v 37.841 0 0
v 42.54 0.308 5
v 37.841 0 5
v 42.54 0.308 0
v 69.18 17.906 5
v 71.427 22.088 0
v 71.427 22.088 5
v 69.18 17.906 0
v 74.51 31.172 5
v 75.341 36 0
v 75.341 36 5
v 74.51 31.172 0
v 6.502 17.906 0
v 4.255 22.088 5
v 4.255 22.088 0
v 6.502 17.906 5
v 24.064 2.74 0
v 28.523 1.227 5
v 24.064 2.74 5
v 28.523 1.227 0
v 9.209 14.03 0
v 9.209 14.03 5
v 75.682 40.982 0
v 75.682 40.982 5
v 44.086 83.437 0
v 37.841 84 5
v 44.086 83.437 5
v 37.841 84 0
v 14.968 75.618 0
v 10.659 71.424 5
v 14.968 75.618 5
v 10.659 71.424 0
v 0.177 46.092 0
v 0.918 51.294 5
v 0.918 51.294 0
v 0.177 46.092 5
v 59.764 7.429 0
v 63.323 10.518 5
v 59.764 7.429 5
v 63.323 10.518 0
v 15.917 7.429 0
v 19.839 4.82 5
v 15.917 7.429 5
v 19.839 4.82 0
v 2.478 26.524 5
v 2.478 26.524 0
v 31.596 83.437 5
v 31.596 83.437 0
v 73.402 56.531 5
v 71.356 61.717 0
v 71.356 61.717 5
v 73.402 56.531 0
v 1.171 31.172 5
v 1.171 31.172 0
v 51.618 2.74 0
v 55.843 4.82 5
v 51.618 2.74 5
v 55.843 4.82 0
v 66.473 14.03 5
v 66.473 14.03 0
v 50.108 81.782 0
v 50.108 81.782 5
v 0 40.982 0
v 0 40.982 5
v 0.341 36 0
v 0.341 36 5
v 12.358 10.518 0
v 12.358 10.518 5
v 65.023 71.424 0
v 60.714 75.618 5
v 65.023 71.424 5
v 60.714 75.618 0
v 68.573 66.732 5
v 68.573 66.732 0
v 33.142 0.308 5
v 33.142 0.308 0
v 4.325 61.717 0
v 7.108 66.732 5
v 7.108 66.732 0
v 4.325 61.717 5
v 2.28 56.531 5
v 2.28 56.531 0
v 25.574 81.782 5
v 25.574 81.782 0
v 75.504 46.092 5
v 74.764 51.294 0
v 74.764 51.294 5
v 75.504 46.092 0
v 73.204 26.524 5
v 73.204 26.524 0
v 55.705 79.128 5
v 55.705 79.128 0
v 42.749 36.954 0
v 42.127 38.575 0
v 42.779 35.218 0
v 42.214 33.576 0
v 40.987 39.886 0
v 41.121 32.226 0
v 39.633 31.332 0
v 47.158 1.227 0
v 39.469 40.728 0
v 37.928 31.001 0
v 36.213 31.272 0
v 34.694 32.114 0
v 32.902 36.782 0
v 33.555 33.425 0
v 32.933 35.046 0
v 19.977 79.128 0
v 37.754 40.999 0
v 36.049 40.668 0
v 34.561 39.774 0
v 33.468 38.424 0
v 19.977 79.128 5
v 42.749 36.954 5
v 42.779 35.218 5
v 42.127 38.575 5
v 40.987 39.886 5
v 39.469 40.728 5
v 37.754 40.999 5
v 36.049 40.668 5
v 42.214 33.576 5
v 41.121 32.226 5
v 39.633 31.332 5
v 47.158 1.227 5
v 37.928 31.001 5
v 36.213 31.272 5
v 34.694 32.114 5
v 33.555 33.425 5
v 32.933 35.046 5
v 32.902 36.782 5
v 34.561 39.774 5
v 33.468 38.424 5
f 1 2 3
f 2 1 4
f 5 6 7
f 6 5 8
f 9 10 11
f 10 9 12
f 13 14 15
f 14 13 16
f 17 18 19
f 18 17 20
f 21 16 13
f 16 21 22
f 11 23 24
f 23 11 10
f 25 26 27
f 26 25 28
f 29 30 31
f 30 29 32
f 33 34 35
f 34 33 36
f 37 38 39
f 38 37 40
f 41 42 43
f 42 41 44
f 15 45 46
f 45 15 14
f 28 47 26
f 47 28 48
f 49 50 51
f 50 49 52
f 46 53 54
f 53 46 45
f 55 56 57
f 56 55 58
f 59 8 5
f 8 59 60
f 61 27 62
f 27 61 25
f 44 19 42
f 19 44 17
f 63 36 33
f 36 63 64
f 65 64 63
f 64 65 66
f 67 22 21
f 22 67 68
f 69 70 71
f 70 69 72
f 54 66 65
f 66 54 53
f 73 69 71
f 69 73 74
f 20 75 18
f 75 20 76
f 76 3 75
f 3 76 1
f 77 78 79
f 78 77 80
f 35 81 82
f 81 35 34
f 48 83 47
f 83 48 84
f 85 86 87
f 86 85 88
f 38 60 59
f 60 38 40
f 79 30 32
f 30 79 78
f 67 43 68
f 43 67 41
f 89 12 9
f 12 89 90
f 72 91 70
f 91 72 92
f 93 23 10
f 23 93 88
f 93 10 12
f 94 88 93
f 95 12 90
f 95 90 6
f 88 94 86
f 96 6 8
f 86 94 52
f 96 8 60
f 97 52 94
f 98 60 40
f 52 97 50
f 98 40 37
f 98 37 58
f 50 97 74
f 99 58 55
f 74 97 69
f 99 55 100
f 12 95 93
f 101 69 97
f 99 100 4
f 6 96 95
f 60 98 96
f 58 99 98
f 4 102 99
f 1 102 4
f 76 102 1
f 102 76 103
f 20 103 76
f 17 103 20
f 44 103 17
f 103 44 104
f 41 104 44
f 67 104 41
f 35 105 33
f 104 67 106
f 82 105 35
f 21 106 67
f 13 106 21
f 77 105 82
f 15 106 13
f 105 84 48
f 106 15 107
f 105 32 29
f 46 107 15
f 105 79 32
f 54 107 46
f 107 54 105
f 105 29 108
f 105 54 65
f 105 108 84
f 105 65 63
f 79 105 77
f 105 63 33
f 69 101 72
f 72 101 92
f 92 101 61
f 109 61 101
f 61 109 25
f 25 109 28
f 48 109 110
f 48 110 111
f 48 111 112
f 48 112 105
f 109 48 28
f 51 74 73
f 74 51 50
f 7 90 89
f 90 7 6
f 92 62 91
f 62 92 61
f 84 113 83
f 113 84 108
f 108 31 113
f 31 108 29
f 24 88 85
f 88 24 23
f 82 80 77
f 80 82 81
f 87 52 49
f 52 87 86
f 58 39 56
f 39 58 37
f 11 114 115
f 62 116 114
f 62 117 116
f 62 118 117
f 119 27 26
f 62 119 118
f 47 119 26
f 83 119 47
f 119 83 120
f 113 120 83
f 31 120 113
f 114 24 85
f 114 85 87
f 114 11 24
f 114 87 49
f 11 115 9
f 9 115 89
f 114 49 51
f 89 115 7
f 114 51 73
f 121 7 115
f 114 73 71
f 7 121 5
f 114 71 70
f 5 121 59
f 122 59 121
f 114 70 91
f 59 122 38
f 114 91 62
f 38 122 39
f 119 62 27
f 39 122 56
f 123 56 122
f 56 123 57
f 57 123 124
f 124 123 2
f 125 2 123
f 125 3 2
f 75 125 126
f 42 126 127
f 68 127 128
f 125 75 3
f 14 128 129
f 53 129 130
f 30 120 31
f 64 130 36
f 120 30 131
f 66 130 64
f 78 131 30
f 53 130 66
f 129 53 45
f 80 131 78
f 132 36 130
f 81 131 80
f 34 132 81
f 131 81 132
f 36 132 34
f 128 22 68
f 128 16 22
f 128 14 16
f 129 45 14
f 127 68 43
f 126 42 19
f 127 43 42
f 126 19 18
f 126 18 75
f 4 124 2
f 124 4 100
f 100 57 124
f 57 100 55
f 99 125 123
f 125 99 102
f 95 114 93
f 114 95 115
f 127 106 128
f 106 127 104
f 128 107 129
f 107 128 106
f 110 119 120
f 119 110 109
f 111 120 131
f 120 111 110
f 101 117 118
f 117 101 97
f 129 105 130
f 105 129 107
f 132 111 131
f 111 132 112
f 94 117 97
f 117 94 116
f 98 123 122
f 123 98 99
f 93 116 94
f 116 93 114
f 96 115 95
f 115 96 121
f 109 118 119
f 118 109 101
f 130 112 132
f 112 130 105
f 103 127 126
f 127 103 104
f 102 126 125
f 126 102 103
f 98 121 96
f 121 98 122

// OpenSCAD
$fn = 32;

// ----------------------------------------------------------------------
// Cam plate: single_lobe cam, base R36
// ----------------------------------------------------------------------

// --- parameters (mm) ---
base_r = 36;              // base circle radius
lobe_h = 12;              // cam lobe rise
bore_r = 5;               // shaft bore radius
plate_t = 5;              // plate thickness, Z (extrusion height)

profile = [[75.341, 36], [75.682, 40.982], [75.504, 46.092], [74.764, 51.294], [73.402, 56.531], [71.356, 61.717], [68.573, 66.732], [65.023, 71.424], [60.714, 75.618], [55.705, 79.128], [50.108, 81.782], [44.086, 83.437], [37.841, 84], [31.596, 83.437], [25.574, 81.782], [19.977, 79.128], [14.968, 75.618], [10.659, 71.424], [7.108, 66.732], [4.325, 61.717], [2.28, 56.531], [0.918, 51.294], [0.177, 46.092], [0, 40.982], [0.341, 36], [1.171, 31.172], [2.478, 26.524], [4.255, 22.088], [6.502, 17.906], [9.209, 14.03], [12.358, 10.518], [15.917, 7.429], [19.839, 4.82], [24.064, 2.74], [28.523, 1.227], [33.142, 0.308], [37.841, 0], [42.54, 0.308], [47.158, 1.227], [51.618, 2.74], [55.843, 4.82], [59.764, 7.429], [63.323, 10.518], [66.473, 14.03], [69.18, 17.906], [71.427, 22.088], [73.204, 26.524], [74.51, 31.172]];  // primary outline, 48 points, counter clockwise
void_1 = [[42.749, 36.954], [42.127, 38.575], [40.987, 39.886], [39.469, 40.728], [37.754, 40.999], [36.049, 40.668], [34.561, 39.774], [33.468, 38.424], [32.902, 36.782], [32.933, 35.046], [33.555, 33.425], [34.694, 32.114], [36.213, 31.272], [37.928, 31.001], [39.633, 31.332], [41.121, 32.226], [42.214, 33.576], [42.779, 35.218]];  // shaft bore, 18 points

// --- the one profile operation ---
difference() {
  linear_extrude(height = plate_t) polygon(points = profile);
  translate([0, 0, -1])
    linear_extrude(height = plate_t + 2) polygon(points = void_1);
}
